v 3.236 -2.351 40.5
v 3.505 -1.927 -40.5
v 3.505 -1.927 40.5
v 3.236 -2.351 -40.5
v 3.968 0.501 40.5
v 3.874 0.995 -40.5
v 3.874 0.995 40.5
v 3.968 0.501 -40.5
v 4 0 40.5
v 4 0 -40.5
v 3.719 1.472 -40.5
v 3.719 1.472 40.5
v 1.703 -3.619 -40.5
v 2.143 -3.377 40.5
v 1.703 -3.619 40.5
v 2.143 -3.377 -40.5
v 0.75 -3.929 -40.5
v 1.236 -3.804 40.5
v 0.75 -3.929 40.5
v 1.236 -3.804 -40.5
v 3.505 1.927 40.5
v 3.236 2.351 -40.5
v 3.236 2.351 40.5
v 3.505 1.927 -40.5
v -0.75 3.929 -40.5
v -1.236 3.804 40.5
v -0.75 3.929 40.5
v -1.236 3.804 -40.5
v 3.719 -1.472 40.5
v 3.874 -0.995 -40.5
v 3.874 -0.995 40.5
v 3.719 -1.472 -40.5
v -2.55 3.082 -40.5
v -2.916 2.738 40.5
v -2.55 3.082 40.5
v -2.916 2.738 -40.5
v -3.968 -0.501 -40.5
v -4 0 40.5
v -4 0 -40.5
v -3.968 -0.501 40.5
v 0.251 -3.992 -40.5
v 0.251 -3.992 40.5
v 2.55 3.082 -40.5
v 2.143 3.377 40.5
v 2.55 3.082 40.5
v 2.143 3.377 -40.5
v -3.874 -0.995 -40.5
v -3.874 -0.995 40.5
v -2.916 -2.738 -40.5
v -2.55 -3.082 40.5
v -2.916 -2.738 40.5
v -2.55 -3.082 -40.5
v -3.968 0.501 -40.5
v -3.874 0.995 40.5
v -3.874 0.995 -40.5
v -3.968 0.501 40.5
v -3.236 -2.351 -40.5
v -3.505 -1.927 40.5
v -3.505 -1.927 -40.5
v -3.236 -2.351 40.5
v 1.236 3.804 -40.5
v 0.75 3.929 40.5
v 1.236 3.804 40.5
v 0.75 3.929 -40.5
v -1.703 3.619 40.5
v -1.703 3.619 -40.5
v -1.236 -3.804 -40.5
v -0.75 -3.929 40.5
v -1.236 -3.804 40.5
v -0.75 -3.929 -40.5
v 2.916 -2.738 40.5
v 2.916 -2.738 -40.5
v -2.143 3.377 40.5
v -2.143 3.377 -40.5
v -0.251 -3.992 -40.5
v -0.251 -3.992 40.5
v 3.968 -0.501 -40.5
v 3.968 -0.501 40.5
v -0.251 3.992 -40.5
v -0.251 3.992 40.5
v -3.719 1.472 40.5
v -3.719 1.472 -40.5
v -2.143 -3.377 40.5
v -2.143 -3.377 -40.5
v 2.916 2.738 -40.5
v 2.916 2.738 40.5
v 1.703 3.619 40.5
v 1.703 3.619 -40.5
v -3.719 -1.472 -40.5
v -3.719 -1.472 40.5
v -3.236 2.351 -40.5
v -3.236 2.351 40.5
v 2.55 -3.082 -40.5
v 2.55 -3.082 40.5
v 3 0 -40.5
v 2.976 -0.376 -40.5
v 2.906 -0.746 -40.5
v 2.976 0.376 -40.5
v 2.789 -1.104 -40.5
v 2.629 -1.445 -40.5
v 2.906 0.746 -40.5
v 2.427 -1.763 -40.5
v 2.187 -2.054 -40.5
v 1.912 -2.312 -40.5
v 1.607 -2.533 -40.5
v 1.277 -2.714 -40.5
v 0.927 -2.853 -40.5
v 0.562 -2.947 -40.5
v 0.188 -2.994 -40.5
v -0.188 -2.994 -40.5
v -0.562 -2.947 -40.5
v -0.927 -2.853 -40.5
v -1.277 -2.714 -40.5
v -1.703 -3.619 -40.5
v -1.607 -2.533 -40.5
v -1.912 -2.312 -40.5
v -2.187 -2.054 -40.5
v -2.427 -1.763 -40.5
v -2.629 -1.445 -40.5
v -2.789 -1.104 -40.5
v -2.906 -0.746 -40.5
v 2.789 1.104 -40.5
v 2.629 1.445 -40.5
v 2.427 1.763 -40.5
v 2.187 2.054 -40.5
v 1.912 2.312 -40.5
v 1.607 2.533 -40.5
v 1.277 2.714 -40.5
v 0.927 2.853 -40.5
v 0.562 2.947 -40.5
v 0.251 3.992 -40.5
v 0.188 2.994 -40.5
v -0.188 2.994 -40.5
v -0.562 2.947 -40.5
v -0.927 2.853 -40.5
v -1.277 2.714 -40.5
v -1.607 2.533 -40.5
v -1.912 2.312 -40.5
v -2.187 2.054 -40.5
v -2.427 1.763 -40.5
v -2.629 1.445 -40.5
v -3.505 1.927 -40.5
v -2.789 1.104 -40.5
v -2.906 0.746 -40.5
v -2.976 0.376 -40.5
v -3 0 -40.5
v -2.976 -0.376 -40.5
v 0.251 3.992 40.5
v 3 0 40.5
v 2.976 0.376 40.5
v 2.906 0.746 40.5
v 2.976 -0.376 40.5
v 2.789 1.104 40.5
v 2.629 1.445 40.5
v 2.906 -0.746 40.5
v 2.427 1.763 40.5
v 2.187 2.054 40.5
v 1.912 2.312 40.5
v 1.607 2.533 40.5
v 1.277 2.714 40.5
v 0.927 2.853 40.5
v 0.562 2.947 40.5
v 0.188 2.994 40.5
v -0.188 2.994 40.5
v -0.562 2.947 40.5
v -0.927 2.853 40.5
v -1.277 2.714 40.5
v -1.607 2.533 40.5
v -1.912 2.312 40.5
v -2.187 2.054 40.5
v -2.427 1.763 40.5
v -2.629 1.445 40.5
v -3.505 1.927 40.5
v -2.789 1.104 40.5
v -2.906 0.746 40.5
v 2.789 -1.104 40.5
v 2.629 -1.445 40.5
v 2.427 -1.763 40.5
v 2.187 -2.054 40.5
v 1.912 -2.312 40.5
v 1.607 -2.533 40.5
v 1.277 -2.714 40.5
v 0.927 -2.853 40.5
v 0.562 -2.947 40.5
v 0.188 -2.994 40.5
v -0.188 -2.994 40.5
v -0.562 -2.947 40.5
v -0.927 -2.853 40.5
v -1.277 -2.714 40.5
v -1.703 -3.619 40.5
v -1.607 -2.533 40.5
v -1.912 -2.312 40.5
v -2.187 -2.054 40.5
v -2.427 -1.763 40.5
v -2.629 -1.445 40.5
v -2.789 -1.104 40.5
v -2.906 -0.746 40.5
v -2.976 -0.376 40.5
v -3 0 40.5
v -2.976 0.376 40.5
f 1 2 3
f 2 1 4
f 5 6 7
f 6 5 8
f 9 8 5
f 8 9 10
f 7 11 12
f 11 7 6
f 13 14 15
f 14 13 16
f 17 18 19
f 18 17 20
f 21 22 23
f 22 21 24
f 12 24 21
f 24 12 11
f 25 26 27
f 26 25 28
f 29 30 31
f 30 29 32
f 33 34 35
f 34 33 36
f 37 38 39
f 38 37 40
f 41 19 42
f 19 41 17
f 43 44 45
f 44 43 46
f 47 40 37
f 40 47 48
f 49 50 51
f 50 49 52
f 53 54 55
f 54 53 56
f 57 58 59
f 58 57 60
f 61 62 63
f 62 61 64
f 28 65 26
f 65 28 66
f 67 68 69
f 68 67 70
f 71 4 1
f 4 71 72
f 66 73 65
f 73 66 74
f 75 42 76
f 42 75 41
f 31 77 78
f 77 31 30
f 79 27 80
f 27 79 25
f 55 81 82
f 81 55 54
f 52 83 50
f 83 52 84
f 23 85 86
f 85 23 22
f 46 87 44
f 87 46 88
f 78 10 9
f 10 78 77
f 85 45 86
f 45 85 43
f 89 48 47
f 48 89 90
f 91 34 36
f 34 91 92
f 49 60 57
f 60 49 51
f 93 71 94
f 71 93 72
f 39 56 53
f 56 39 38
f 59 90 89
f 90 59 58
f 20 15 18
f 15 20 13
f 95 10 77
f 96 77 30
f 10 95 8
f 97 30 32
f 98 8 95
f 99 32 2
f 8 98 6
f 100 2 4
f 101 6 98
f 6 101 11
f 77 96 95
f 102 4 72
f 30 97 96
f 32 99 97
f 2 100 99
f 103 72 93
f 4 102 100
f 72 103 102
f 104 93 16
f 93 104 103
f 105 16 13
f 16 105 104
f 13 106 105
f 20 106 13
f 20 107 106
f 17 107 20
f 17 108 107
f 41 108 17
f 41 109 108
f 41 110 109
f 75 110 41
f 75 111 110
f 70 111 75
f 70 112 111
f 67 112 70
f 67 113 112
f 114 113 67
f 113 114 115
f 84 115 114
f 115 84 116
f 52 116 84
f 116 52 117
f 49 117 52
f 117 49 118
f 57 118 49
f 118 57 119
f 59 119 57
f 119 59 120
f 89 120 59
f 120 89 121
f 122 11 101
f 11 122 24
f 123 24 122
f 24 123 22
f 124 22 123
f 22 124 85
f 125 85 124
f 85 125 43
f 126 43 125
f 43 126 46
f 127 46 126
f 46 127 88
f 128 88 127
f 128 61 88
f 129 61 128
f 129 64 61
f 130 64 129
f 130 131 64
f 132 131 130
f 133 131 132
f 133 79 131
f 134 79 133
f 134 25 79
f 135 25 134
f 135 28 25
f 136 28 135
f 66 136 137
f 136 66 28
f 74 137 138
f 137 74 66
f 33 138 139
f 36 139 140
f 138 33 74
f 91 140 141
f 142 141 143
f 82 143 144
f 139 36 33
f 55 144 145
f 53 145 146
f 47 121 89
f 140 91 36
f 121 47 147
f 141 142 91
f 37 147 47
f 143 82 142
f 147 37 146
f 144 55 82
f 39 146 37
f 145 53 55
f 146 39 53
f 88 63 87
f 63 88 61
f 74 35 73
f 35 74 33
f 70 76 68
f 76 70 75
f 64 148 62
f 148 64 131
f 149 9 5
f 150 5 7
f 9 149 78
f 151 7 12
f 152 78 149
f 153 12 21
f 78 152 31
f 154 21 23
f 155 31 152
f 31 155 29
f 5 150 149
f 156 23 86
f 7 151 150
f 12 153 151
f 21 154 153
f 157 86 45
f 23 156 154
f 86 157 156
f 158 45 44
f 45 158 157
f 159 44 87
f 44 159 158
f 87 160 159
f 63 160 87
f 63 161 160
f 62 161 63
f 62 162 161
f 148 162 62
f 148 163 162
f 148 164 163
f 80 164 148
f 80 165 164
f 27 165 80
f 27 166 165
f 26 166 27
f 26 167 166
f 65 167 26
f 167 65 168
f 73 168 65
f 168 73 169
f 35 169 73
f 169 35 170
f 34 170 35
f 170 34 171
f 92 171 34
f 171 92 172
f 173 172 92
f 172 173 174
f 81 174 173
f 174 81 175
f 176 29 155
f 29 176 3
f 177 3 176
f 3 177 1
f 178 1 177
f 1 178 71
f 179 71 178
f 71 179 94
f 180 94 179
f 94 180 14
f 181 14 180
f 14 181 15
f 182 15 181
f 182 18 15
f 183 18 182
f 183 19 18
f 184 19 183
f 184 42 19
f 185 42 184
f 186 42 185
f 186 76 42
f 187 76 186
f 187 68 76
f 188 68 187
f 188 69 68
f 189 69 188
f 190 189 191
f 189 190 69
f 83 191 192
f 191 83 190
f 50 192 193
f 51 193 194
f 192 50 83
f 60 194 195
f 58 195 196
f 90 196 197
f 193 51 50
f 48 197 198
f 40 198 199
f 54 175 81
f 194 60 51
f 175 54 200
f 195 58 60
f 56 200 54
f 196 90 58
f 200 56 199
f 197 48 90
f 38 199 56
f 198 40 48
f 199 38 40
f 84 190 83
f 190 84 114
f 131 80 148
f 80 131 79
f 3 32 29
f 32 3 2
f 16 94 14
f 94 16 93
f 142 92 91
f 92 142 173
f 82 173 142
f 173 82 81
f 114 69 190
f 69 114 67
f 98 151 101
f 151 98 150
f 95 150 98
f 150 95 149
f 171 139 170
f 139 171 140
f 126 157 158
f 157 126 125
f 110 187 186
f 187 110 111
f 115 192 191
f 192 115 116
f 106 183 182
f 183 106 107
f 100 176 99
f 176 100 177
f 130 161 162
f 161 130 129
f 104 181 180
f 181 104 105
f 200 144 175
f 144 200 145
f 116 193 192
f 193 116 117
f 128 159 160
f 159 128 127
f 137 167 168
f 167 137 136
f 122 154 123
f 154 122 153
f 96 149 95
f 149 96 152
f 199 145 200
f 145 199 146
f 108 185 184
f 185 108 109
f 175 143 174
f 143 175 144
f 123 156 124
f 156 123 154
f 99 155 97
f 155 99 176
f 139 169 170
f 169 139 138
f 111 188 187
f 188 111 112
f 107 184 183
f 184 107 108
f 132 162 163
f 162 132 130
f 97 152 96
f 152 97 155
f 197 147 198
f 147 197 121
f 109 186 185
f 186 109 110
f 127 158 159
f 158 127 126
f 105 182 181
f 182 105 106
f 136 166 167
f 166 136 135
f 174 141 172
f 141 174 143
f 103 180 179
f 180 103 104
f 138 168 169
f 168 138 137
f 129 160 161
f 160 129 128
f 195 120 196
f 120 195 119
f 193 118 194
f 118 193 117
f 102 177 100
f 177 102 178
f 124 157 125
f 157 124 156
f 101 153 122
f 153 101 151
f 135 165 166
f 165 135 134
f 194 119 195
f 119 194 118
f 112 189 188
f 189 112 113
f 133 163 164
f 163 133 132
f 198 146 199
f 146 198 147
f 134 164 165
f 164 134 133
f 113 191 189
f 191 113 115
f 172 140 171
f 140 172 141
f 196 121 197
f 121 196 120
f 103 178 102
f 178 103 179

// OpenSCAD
$fn = 50;


difference() {
	union() {
		translate(v = [0, 0, -40.5000000000]) {
			cylinder(h = 81, r = 4.0000000000);
		}
	}
	union() {
		translate(v = [0, 0, -100.0000000000]) {
			cylinder(h = 200, r = 3.0000000000);
		}
	}
}
